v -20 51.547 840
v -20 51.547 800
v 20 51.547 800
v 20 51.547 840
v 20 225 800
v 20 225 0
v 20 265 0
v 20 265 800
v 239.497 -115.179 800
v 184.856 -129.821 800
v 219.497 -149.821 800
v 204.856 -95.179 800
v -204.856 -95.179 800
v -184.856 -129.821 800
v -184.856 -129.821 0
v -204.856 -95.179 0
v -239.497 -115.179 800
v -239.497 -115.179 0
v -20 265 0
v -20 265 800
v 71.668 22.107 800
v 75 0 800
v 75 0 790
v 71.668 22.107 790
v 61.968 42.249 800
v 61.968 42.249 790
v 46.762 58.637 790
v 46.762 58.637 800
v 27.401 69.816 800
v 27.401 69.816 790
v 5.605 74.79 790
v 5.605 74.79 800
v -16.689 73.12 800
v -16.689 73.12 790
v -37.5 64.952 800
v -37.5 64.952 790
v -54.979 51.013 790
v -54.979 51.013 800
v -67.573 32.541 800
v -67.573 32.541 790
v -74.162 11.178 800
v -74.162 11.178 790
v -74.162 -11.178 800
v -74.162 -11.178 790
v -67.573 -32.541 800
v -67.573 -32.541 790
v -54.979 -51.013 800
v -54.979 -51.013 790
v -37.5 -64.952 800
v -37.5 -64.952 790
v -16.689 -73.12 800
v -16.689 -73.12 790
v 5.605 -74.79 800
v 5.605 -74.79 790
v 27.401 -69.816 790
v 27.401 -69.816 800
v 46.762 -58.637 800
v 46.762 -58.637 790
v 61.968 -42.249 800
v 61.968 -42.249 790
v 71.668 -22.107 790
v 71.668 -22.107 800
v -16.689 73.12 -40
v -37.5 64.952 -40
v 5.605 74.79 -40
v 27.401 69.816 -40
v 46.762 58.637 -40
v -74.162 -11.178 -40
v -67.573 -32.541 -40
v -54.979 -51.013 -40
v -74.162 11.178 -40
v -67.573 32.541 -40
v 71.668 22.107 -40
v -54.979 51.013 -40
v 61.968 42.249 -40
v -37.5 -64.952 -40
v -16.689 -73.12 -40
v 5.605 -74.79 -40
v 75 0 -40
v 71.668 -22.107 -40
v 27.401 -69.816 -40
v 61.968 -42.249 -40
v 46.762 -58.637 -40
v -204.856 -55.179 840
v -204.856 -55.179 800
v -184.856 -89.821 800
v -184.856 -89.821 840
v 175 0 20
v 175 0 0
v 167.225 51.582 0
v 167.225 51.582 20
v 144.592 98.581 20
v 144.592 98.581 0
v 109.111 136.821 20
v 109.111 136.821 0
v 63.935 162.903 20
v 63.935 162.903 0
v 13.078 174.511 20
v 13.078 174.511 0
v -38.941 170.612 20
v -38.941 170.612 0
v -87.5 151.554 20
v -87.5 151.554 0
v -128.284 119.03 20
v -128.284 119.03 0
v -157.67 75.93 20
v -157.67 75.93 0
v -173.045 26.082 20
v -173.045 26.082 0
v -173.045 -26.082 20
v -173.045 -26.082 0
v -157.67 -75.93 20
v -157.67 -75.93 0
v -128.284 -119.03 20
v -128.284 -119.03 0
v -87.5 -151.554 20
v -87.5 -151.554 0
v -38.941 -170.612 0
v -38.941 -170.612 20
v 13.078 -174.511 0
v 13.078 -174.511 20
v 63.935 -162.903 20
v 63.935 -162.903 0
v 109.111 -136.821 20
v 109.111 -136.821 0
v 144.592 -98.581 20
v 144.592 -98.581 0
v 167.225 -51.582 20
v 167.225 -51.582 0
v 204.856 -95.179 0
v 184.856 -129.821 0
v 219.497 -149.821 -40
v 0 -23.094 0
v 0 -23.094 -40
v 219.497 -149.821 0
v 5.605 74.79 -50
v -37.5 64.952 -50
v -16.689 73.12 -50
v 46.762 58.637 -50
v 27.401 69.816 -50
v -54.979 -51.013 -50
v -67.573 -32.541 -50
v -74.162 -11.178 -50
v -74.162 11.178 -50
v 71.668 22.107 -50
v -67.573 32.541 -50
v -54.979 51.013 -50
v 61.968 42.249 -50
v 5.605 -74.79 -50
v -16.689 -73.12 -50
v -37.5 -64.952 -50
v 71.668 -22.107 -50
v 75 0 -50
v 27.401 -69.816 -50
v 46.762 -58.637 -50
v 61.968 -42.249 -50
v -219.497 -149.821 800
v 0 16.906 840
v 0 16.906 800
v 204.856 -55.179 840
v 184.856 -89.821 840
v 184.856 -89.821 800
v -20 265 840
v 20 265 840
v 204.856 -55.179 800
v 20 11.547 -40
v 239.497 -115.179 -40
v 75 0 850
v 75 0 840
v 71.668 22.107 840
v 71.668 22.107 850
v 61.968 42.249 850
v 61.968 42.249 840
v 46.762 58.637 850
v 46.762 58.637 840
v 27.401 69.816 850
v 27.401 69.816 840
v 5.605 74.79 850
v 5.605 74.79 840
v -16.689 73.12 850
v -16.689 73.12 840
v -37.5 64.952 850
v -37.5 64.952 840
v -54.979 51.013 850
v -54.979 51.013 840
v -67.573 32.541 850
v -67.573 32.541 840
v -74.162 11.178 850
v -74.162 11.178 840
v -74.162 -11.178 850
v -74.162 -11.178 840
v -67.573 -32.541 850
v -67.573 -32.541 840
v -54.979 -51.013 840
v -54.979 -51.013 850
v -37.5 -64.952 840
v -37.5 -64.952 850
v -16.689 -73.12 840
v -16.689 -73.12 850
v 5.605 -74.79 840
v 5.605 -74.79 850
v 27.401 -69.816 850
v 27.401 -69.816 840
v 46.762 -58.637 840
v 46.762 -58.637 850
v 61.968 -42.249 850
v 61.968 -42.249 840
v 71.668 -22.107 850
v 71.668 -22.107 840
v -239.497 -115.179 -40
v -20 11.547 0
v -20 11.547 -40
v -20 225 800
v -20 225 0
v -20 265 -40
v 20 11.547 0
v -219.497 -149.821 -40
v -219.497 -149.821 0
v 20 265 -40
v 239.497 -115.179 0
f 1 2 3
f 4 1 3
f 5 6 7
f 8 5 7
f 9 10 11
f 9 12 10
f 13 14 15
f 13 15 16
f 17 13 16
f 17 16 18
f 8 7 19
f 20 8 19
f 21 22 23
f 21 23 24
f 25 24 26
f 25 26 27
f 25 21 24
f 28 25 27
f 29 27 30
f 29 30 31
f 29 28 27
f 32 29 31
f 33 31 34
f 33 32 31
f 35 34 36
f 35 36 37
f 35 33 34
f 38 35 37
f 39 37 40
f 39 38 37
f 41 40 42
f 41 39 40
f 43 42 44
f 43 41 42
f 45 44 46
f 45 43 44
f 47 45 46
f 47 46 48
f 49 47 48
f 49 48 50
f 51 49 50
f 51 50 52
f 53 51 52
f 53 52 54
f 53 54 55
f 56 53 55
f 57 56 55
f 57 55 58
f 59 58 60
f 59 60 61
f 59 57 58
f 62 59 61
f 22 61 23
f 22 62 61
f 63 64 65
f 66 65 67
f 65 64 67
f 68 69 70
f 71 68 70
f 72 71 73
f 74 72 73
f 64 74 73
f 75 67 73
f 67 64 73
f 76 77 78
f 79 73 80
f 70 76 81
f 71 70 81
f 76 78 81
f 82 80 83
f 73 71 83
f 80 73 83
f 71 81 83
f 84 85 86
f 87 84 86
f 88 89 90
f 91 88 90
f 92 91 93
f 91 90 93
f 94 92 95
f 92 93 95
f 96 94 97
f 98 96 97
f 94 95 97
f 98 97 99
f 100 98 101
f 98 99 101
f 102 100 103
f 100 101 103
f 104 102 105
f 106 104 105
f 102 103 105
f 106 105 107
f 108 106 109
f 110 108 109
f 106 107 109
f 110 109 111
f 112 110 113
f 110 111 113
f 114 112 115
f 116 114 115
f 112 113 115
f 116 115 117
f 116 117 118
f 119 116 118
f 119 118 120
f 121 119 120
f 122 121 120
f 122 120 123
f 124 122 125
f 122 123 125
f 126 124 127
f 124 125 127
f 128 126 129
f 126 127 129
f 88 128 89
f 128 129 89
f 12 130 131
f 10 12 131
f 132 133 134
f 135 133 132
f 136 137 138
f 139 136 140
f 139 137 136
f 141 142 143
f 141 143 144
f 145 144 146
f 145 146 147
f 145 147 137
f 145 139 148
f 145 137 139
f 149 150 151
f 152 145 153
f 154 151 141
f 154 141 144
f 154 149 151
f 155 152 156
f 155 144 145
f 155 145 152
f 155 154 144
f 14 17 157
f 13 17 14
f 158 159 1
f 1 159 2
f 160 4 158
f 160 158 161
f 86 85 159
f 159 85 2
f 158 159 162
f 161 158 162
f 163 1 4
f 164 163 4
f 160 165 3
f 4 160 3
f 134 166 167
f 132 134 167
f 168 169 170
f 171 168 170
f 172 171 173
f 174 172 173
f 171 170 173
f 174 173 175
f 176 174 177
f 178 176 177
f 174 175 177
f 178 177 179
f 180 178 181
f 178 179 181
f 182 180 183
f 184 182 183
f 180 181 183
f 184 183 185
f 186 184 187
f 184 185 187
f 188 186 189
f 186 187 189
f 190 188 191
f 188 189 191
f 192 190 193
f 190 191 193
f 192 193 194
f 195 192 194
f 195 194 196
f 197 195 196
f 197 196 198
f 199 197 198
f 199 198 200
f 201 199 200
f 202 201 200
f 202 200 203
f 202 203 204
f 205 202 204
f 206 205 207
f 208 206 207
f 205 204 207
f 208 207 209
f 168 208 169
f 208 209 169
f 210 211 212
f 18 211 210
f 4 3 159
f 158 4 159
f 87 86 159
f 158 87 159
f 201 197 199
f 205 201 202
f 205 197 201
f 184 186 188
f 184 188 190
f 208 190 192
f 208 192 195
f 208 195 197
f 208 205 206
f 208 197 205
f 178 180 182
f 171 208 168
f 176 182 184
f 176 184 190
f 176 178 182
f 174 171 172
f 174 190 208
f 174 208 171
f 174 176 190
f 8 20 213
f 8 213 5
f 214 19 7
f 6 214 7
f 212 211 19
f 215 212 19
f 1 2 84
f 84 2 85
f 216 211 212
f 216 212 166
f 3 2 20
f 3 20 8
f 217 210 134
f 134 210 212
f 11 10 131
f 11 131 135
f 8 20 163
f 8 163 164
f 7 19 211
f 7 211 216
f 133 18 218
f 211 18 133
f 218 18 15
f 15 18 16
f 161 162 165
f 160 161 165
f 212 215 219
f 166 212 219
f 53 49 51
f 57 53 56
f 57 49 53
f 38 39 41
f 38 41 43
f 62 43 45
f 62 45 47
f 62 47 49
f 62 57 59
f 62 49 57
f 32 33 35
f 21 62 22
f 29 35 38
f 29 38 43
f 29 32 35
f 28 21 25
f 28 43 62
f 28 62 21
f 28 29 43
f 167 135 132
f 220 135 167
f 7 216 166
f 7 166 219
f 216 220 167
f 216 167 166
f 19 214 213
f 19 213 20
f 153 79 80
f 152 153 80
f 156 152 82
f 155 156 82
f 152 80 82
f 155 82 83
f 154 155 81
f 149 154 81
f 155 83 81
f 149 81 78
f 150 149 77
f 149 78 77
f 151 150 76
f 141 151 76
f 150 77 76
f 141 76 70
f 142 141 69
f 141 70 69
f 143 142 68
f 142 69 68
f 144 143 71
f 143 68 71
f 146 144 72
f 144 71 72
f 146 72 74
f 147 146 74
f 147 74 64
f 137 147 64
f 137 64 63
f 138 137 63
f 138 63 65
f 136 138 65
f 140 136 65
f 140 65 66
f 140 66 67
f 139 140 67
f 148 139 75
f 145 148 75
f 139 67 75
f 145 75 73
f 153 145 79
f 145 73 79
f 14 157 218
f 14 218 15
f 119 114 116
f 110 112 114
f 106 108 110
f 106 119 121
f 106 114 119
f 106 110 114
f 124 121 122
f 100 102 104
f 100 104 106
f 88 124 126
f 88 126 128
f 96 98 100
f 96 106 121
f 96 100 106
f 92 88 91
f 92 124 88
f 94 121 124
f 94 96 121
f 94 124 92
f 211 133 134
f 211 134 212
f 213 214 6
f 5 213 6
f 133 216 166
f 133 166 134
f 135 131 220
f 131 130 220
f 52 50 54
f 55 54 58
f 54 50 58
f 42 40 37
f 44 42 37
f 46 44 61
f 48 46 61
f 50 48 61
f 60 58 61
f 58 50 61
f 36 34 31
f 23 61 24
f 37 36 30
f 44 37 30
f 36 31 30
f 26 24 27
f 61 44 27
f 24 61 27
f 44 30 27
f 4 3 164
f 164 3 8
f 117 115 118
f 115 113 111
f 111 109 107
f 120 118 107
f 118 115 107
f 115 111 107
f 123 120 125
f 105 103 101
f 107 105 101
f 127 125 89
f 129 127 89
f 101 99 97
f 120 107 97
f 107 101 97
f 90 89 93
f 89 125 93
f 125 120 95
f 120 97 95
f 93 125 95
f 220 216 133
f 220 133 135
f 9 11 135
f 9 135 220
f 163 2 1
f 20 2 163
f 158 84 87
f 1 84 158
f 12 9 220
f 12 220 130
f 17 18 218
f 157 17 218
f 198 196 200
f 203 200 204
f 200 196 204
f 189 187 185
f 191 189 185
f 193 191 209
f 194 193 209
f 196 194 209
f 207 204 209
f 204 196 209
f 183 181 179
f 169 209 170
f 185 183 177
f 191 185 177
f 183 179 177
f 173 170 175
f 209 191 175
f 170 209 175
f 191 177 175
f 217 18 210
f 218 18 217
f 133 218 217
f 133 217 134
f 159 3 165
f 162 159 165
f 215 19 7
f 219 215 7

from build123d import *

# Parameters (mm, degrees)
F0_W      = 20
F0_H      = 40
F1_DEPTH  = 800
F2_DEPTH  = 20
F3_W      = 40
F3_H      = 253.4529946162
F4_DEPTH  = 40
F5_DEPTH  = 800
F8_DEPTH  = 40
F7_W      = 40
F7_H      = 213.4529946162
F10_R     = 75
F11_DEPTH = 10
F12_R     = 75
F13_DEPTH = 10
F15_R     = 75
F16_DEPTH = 10


with BuildPart() as f1:
    # F0 (on Top) → F1 (new body)
    with BuildSketch(Plane.XY):
        with Locations((-10, 245)):
            Rectangle(F0_W, F0_H)
        with Locations((10, 245)):
            Rectangle(F0_W, F0_H)
    extrude(amount=F1_DEPTH)


with BuildPart() as f2:
    # F0 (on Top) → F2 (new body)
    with BuildSketch(Plane.XY):
        with BuildLine():
            Line((0, 0), (0, 175))
            ThreePointArc((0, 175), (-151.5544456623, 87.5), (-151.5544456623, -87.5))
            Line((-151.5544456623, -87.5), (0, 0))
        make_face()
        with BuildLine():
            ThreePointArc((151.5544456623, -87.5), (169.0370196006, -45.2933328929), (175, 0))
            ThreePointArc((175, 0), (123.7436867076, 123.7436867076), (0, 175))
            Line((0, 175), (0, 0))
            Line((0, 0), (151.5544456623, -87.5))
        make_face()
        with BuildLine():
            ThreePointArc((-151.5544456623, -87.5), (0, -175), (151.5544456623, -87.5))
            Line((151.5544456623, -87.5), (0, 0))
            Line((0, 0), (-151.5544456623, -87.5))
        make_face()
    extrude(amount=F2_DEPTH)


with BuildPart() as f4:
    # F3 (on Top) → F4 (new body)
    with BuildSketch(Plane.XY):
        with Locations((0, 138.2735026919)):
            Rectangle(F3_W, F3_H)
    extrude(amount=-F4_DEPTH)


with BuildPart() as f4b:
    # F3 (on Top) → F4, piece 2 (new body)
    with BuildSketch(Plane.XY):
        Polygon((239.4967320029, -115.1794919243), (20, 11.5470053838), (0, -23.0940107676), (219.4967320029, -149.8205080757), align=None)
    extrude(amount=-F4_DEPTH)


with BuildPart() as f4c:
    # F3 (on Top) → F4, piece 3 (new body)
    with BuildSketch(Plane.XY):
        Polygon((0, -23.0940107676), (-20, 11.5470053838), (-239.4967320029, -115.1794919243), (-219.4967320029, -149.8205080757), align=None)
    extrude(amount=-F4_DEPTH)


with BuildPart() as f5:
    # F0 (on Top) → F5 (new body)
    with BuildSketch(Plane.XY):
        Polygon((-229.4967320029, -132.5), (-194.8557158515, -112.5), (-204.8557158515, -95.1794919243), (-239.4967320029, -115.1794919243), align=None)
        Polygon((-184.8557158515, -129.8205080757), (-194.8557158515, -112.5), (-229.4967320029, -132.5), (-219.4967320029, -149.8205080757), align=None)
    extrude(amount=F5_DEPTH)


with BuildPart() as f5b:
    # F0 (on Top) → F5, piece 2 (new body)
    with BuildSketch(Plane.XY):
        Polygon((229.4967320029, -132.5), (194.8557158515, -112.5), (184.8557158515, -129.8205080757), (219.4967320029, -149.8205080757), align=None)
        Polygon((204.8557158515, -95.1794919243), (194.8557158515, -112.5), (229.4967320029, -132.5), (239.4967320029, -115.1794919243), align=None)
    extrude(amount=F5_DEPTH)


with BuildPart() as f8:
    # F7 (on offset) → F8 (new body)
    with BuildSketch(Plane.XY.offset(800)):
        Polygon((0, 16.9059892324), (-20, 51.5470053838), (-204.8557158515, -55.1794919243), (-184.8557158515, -89.8205080757), align=None)
    extrude(amount=F8_DEPTH)


with BuildPart() as f8b:
    # F7 (on offset) → F8, piece 2 (new body)
    with BuildSketch(Plane.XY.offset(800)):
        with Locations((0, 158.2735026919)):
            Rectangle(F7_W, F7_H)
    extrude(amount=F8_DEPTH)


with BuildPart() as f8c:
    # F7 (on offset) → F8, piece 3 (new body)
    with BuildSketch(Plane.XY.offset(800)):
        Polygon((204.8557158515, -55.1794919243), (20, 51.5470053838), (0, 16.9059892324), (184.8557158515, -89.8205080757), align=None)
    extrude(amount=F8_DEPTH)


with BuildPart() as f11:
    # F10 (on offset) → F11 (new body)
    with BuildSketch(Plane.XY.offset(840)):
        Circle(F10_R)
    extrude(amount=F11_DEPTH)


with BuildPart() as f13:
    # F12 (on offset) → F13 (new body)
    with BuildSketch(Plane.XY.offset(800)):
        Circle(F12_R)
    extrude(amount=-F13_DEPTH)


with BuildPart() as f16:
    # F15 (on offset) → F16 (new body)
    with BuildSketch(Plane(origin=(0, 0, -40), x_dir=(1, 0, 0), z_dir=(0, 0, -1))):
        Circle(F15_R)
    extrude(amount=F16_DEPTH)


solid = Compound([f1.part, f2.part, f4.part, f4b.part, f4c.part, f5.part, f5b.part, f8.part, f8b.part, f8c.part, f11.part, f13.part, f16.part])
